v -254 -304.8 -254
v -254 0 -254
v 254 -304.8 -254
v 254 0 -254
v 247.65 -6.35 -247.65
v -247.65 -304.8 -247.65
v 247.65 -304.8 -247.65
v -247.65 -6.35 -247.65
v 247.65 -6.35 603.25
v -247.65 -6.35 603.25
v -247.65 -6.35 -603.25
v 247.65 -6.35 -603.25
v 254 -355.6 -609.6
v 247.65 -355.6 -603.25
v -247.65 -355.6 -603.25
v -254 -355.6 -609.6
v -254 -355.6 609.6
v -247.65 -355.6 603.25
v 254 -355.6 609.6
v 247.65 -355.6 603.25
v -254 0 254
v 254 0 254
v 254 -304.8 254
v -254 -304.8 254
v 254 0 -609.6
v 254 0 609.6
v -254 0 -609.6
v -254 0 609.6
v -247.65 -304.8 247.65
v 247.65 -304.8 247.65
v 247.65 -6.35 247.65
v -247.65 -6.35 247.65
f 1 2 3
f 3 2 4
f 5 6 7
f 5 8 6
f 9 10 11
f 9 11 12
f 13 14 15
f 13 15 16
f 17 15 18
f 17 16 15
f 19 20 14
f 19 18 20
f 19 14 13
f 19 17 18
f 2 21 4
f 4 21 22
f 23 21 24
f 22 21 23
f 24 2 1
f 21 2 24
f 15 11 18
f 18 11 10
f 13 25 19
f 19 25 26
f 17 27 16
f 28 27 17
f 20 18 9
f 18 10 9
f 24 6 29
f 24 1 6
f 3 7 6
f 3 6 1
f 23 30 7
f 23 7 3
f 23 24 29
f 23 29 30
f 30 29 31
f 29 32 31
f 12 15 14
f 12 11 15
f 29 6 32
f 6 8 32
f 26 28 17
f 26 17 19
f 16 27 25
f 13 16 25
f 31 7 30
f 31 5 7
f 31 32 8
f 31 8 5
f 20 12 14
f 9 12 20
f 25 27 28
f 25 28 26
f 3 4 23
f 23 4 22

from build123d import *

# Parameters (mm, degrees)
F0_W     = 508
F0_H     = 1219.2
F1_DEPTH = 355.6
F2_W     = 508
F2_H     = 508
F3_DEPTH = 304.8
F4_T     = -6.35
F5_T     = -6.35


with BuildPart() as f1:
    # F0 (on Front) → F1 (new body)
    with BuildSketch(Plane.XZ):
        Rectangle(F0_W, F0_H)
    extrude(amount=F1_DEPTH)

    # F5
    f5_openings = [f1.faces().sort_by_distance(p)[0] for p in [
        (0, -355.6, 0),
    ]]
    offset(amount=F5_T, openings=f5_openings)


with BuildPart() as f3:
    # F2 (on Front) → F3 (new body)
    with BuildSketch(Plane.XZ):
        Rectangle(F2_W, F2_H)
    extrude(amount=F3_DEPTH)

    # F4
    f4_openings = [f3.faces().sort_by_distance(p)[0] for p in [
        (0, -304.8, 0),
    ]]
    offset(amount=F4_T, openings=f4_openings)


solid = Compound([f1.part, f3.part])
